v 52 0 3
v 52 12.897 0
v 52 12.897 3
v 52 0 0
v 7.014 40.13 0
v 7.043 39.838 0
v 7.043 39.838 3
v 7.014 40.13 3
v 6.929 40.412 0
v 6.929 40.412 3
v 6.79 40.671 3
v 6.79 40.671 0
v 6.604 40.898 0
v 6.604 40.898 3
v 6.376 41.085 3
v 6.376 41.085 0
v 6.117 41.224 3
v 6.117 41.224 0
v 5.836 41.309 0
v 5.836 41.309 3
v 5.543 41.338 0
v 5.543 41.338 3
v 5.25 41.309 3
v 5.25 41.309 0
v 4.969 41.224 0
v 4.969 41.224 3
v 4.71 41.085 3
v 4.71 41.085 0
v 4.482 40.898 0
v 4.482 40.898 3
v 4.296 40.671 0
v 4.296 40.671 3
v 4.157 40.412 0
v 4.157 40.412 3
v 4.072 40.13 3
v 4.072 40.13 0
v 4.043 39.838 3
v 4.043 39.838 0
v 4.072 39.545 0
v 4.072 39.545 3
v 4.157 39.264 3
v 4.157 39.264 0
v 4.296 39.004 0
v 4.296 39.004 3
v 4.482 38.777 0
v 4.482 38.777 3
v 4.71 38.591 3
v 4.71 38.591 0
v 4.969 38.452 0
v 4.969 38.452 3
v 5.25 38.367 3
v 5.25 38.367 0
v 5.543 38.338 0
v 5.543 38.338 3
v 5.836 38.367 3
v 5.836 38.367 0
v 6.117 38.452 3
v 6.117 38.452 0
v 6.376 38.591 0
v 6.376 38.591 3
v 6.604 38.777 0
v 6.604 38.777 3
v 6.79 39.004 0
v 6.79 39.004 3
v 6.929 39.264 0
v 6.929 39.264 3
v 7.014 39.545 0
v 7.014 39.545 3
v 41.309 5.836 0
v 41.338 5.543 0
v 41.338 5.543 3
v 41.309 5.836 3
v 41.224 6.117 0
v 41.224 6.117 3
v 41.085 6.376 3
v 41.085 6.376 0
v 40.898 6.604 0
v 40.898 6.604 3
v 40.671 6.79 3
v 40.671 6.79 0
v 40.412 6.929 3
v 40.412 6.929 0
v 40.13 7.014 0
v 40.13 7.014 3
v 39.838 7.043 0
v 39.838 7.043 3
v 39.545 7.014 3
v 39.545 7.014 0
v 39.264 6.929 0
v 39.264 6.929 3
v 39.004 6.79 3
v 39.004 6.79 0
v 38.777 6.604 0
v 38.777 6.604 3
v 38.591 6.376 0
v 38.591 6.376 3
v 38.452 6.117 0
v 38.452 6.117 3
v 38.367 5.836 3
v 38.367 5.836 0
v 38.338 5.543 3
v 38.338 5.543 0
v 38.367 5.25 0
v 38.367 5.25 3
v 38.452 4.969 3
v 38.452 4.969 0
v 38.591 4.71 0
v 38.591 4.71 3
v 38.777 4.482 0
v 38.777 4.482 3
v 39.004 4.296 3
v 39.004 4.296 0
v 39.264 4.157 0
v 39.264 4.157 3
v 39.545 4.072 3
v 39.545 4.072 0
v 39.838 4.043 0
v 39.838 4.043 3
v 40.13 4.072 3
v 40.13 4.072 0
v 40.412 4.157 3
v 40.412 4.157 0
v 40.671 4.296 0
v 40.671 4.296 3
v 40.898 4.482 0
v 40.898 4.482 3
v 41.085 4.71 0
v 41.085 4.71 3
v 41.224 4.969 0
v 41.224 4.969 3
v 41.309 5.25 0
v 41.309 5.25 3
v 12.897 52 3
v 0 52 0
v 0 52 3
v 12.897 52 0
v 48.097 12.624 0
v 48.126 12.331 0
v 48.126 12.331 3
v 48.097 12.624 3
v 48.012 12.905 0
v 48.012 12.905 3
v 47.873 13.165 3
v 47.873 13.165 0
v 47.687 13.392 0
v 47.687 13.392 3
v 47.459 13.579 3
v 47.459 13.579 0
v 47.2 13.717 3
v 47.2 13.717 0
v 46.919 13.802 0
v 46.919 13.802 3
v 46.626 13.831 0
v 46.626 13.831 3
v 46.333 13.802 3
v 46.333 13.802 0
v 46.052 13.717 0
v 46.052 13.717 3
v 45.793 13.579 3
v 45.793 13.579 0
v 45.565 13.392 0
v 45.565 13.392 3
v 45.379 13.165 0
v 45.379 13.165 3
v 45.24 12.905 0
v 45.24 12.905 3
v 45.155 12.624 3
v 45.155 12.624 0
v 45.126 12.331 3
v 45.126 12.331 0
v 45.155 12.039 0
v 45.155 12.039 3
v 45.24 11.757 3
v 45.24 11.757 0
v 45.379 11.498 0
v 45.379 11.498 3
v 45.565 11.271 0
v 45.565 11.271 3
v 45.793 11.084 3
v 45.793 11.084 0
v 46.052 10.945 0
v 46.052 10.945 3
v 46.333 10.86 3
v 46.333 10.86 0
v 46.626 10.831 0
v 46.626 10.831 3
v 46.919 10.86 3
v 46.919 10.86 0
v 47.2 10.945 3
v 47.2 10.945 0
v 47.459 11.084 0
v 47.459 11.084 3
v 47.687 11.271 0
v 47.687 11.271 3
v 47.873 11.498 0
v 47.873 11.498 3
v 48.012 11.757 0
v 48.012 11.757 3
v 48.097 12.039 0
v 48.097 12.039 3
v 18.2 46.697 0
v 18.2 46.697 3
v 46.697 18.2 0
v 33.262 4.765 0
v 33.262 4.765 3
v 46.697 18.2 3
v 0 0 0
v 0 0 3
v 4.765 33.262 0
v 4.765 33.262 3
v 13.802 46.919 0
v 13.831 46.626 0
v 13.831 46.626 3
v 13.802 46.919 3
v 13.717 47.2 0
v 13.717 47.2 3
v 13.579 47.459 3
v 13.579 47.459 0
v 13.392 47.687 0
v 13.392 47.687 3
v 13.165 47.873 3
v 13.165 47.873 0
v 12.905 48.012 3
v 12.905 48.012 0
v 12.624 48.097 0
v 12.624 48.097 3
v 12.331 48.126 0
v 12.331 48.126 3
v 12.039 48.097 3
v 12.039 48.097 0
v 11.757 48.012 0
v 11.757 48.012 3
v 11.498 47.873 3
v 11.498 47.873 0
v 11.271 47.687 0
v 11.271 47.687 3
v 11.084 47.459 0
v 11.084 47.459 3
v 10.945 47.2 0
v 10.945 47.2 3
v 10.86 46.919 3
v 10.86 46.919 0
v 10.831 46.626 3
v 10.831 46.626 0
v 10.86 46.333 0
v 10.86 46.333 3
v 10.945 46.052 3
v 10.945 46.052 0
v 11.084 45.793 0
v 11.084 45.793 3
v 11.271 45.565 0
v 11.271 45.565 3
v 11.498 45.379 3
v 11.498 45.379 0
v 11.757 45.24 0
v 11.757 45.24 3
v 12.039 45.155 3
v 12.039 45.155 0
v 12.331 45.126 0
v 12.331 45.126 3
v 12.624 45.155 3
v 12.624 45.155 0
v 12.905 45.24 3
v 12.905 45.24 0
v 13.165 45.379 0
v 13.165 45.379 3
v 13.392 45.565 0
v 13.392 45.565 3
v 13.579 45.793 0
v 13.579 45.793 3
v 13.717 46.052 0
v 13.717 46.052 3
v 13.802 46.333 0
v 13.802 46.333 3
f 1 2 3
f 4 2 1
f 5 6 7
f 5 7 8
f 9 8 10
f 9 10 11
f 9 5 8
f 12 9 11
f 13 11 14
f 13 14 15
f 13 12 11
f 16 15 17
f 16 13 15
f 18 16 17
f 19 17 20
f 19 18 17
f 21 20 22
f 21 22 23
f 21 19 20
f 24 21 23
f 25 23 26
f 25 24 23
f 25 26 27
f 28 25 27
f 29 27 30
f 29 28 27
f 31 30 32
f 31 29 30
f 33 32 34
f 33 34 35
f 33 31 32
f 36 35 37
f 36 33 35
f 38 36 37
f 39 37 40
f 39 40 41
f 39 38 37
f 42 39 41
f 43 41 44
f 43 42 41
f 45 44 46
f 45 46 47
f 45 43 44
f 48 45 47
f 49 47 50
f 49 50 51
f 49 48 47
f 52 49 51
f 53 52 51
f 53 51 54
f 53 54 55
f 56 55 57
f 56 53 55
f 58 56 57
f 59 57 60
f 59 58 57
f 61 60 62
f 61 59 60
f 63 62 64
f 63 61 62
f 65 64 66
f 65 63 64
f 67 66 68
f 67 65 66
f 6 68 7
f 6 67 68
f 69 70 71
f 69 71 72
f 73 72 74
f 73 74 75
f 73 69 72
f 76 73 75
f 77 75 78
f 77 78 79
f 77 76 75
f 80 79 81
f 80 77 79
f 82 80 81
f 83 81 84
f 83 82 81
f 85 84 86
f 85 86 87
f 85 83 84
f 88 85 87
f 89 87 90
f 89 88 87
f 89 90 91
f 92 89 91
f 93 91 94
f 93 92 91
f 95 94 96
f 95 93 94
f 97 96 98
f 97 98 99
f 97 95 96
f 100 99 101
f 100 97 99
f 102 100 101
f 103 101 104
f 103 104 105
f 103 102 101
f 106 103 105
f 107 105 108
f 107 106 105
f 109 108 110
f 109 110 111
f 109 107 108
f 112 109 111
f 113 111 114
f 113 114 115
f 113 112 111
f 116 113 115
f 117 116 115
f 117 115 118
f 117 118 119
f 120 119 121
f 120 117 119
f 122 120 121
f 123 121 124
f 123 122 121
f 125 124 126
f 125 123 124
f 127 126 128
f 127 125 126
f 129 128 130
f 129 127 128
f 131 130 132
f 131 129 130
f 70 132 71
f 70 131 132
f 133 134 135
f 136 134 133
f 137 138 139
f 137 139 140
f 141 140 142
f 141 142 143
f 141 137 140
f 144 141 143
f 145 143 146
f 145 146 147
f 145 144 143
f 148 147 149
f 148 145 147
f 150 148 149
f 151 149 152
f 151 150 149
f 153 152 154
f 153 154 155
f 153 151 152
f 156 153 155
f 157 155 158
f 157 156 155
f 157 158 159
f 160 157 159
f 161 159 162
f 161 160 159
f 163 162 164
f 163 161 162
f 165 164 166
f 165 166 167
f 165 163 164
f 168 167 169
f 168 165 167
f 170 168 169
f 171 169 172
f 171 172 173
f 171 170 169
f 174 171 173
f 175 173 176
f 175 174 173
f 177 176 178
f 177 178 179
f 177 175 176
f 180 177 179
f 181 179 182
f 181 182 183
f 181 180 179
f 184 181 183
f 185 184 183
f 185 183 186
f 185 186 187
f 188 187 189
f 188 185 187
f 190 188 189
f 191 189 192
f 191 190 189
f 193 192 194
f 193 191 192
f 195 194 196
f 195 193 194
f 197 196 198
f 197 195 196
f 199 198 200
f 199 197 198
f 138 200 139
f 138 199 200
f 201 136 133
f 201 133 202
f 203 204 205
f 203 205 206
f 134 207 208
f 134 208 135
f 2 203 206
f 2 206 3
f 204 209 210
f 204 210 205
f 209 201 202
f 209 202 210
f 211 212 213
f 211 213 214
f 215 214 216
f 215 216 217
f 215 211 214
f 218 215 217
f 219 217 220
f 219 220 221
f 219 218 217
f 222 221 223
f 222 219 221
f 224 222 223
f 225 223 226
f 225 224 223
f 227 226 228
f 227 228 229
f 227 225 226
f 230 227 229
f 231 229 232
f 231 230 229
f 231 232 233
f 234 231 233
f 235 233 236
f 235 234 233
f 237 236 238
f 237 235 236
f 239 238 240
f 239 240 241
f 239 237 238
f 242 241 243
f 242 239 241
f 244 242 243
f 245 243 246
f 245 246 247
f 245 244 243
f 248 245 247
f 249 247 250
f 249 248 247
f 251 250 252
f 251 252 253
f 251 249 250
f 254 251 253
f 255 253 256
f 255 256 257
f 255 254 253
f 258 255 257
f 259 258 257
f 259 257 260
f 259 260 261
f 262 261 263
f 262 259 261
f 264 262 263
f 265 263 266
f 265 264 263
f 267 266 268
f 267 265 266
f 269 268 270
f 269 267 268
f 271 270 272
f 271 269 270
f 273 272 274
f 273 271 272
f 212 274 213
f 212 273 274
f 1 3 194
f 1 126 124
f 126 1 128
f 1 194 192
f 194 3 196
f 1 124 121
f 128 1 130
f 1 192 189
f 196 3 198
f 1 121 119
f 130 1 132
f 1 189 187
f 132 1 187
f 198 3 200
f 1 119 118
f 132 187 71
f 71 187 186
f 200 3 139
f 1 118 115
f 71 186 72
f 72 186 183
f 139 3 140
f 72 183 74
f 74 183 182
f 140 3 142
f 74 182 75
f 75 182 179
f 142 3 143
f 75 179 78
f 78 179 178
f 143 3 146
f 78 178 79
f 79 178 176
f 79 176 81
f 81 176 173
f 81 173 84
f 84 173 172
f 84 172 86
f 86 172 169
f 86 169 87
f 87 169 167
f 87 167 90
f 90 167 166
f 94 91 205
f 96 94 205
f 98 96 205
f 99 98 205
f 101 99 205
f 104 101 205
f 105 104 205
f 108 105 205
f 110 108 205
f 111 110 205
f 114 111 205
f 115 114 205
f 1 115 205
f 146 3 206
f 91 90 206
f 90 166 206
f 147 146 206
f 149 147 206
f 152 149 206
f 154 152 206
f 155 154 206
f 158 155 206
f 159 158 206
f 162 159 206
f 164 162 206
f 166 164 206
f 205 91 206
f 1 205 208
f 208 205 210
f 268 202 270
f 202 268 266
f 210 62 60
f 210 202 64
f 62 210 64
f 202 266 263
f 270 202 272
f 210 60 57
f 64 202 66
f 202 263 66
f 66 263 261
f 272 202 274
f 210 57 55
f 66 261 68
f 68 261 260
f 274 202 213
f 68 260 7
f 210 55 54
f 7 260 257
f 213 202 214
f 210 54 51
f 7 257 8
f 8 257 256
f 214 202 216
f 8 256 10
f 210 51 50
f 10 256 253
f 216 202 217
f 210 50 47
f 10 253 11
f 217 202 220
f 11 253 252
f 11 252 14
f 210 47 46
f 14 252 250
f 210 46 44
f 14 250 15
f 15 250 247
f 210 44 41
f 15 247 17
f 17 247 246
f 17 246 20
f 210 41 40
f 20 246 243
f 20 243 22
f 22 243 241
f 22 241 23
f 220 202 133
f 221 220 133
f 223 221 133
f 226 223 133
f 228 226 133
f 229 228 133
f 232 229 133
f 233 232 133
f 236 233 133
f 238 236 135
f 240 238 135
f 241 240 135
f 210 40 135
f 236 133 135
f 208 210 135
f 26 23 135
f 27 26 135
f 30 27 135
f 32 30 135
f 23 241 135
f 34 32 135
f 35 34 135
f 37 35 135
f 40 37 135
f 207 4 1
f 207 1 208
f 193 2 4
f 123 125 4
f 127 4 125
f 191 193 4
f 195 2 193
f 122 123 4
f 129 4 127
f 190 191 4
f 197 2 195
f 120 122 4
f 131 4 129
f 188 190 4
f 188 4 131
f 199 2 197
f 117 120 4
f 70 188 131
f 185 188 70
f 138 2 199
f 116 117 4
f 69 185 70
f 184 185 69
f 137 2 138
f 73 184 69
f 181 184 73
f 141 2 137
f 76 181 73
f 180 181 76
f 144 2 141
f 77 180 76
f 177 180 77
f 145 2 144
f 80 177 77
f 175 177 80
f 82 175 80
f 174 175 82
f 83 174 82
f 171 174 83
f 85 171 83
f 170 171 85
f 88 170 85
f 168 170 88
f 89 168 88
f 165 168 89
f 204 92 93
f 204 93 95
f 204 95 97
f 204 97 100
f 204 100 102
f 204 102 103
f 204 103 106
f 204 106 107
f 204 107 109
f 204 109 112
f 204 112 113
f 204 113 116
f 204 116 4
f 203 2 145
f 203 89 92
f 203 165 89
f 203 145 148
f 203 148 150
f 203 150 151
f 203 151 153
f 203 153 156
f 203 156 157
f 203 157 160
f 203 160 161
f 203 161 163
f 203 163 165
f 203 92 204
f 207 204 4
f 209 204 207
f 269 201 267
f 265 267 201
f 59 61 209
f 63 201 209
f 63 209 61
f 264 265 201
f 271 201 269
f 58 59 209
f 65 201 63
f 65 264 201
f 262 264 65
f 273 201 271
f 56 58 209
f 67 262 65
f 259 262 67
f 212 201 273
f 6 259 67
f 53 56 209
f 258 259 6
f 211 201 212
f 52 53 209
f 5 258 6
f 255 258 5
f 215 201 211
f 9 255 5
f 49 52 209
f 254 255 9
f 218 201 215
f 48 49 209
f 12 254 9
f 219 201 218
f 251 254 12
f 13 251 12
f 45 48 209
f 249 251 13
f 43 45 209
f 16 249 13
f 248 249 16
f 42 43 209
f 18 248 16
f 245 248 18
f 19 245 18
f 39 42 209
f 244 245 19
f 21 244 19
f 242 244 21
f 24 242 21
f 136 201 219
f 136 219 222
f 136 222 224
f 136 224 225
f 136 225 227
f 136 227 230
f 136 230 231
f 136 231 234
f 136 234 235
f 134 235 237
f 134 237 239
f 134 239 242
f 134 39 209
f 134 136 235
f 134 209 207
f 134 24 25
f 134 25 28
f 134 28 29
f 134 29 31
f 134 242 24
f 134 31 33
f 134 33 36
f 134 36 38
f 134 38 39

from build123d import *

# Parameters (mm, degrees)
MODEL_R                 = 1.5
SALIENTE_EXTRUIR2_DEPTH = 3


with BuildPart() as part:
    # Model → Saliente-Extruir2 (new body)
    with BuildSketch(Plane.XY):
        Polygon((18.200296, 46.696699), (4.765267, 33.26167), (33.26167, 4.765267), (46.696699, 18.200296), (52, 12.896995), (52, 0), (0, 0), (0, 52), (12.896995, 52), align=None)
        with Locations((39.837763, 5.543084)):
            Circle(MODEL_R, mode=Mode.SUBTRACT)
        with Locations((46.625988, 12.33131)):
            Circle(MODEL_R, mode=Mode.SUBTRACT)
        with Locations((12.33131, 46.625988)):
            Circle(MODEL_R, mode=Mode.SUBTRACT)
        with Locations((5.543084, 39.837763)):
            Circle(MODEL_R, mode=Mode.SUBTRACT)
    extrude(amount=SALIENTE_EXTRUIR2_DEPTH)


solid = part.part
